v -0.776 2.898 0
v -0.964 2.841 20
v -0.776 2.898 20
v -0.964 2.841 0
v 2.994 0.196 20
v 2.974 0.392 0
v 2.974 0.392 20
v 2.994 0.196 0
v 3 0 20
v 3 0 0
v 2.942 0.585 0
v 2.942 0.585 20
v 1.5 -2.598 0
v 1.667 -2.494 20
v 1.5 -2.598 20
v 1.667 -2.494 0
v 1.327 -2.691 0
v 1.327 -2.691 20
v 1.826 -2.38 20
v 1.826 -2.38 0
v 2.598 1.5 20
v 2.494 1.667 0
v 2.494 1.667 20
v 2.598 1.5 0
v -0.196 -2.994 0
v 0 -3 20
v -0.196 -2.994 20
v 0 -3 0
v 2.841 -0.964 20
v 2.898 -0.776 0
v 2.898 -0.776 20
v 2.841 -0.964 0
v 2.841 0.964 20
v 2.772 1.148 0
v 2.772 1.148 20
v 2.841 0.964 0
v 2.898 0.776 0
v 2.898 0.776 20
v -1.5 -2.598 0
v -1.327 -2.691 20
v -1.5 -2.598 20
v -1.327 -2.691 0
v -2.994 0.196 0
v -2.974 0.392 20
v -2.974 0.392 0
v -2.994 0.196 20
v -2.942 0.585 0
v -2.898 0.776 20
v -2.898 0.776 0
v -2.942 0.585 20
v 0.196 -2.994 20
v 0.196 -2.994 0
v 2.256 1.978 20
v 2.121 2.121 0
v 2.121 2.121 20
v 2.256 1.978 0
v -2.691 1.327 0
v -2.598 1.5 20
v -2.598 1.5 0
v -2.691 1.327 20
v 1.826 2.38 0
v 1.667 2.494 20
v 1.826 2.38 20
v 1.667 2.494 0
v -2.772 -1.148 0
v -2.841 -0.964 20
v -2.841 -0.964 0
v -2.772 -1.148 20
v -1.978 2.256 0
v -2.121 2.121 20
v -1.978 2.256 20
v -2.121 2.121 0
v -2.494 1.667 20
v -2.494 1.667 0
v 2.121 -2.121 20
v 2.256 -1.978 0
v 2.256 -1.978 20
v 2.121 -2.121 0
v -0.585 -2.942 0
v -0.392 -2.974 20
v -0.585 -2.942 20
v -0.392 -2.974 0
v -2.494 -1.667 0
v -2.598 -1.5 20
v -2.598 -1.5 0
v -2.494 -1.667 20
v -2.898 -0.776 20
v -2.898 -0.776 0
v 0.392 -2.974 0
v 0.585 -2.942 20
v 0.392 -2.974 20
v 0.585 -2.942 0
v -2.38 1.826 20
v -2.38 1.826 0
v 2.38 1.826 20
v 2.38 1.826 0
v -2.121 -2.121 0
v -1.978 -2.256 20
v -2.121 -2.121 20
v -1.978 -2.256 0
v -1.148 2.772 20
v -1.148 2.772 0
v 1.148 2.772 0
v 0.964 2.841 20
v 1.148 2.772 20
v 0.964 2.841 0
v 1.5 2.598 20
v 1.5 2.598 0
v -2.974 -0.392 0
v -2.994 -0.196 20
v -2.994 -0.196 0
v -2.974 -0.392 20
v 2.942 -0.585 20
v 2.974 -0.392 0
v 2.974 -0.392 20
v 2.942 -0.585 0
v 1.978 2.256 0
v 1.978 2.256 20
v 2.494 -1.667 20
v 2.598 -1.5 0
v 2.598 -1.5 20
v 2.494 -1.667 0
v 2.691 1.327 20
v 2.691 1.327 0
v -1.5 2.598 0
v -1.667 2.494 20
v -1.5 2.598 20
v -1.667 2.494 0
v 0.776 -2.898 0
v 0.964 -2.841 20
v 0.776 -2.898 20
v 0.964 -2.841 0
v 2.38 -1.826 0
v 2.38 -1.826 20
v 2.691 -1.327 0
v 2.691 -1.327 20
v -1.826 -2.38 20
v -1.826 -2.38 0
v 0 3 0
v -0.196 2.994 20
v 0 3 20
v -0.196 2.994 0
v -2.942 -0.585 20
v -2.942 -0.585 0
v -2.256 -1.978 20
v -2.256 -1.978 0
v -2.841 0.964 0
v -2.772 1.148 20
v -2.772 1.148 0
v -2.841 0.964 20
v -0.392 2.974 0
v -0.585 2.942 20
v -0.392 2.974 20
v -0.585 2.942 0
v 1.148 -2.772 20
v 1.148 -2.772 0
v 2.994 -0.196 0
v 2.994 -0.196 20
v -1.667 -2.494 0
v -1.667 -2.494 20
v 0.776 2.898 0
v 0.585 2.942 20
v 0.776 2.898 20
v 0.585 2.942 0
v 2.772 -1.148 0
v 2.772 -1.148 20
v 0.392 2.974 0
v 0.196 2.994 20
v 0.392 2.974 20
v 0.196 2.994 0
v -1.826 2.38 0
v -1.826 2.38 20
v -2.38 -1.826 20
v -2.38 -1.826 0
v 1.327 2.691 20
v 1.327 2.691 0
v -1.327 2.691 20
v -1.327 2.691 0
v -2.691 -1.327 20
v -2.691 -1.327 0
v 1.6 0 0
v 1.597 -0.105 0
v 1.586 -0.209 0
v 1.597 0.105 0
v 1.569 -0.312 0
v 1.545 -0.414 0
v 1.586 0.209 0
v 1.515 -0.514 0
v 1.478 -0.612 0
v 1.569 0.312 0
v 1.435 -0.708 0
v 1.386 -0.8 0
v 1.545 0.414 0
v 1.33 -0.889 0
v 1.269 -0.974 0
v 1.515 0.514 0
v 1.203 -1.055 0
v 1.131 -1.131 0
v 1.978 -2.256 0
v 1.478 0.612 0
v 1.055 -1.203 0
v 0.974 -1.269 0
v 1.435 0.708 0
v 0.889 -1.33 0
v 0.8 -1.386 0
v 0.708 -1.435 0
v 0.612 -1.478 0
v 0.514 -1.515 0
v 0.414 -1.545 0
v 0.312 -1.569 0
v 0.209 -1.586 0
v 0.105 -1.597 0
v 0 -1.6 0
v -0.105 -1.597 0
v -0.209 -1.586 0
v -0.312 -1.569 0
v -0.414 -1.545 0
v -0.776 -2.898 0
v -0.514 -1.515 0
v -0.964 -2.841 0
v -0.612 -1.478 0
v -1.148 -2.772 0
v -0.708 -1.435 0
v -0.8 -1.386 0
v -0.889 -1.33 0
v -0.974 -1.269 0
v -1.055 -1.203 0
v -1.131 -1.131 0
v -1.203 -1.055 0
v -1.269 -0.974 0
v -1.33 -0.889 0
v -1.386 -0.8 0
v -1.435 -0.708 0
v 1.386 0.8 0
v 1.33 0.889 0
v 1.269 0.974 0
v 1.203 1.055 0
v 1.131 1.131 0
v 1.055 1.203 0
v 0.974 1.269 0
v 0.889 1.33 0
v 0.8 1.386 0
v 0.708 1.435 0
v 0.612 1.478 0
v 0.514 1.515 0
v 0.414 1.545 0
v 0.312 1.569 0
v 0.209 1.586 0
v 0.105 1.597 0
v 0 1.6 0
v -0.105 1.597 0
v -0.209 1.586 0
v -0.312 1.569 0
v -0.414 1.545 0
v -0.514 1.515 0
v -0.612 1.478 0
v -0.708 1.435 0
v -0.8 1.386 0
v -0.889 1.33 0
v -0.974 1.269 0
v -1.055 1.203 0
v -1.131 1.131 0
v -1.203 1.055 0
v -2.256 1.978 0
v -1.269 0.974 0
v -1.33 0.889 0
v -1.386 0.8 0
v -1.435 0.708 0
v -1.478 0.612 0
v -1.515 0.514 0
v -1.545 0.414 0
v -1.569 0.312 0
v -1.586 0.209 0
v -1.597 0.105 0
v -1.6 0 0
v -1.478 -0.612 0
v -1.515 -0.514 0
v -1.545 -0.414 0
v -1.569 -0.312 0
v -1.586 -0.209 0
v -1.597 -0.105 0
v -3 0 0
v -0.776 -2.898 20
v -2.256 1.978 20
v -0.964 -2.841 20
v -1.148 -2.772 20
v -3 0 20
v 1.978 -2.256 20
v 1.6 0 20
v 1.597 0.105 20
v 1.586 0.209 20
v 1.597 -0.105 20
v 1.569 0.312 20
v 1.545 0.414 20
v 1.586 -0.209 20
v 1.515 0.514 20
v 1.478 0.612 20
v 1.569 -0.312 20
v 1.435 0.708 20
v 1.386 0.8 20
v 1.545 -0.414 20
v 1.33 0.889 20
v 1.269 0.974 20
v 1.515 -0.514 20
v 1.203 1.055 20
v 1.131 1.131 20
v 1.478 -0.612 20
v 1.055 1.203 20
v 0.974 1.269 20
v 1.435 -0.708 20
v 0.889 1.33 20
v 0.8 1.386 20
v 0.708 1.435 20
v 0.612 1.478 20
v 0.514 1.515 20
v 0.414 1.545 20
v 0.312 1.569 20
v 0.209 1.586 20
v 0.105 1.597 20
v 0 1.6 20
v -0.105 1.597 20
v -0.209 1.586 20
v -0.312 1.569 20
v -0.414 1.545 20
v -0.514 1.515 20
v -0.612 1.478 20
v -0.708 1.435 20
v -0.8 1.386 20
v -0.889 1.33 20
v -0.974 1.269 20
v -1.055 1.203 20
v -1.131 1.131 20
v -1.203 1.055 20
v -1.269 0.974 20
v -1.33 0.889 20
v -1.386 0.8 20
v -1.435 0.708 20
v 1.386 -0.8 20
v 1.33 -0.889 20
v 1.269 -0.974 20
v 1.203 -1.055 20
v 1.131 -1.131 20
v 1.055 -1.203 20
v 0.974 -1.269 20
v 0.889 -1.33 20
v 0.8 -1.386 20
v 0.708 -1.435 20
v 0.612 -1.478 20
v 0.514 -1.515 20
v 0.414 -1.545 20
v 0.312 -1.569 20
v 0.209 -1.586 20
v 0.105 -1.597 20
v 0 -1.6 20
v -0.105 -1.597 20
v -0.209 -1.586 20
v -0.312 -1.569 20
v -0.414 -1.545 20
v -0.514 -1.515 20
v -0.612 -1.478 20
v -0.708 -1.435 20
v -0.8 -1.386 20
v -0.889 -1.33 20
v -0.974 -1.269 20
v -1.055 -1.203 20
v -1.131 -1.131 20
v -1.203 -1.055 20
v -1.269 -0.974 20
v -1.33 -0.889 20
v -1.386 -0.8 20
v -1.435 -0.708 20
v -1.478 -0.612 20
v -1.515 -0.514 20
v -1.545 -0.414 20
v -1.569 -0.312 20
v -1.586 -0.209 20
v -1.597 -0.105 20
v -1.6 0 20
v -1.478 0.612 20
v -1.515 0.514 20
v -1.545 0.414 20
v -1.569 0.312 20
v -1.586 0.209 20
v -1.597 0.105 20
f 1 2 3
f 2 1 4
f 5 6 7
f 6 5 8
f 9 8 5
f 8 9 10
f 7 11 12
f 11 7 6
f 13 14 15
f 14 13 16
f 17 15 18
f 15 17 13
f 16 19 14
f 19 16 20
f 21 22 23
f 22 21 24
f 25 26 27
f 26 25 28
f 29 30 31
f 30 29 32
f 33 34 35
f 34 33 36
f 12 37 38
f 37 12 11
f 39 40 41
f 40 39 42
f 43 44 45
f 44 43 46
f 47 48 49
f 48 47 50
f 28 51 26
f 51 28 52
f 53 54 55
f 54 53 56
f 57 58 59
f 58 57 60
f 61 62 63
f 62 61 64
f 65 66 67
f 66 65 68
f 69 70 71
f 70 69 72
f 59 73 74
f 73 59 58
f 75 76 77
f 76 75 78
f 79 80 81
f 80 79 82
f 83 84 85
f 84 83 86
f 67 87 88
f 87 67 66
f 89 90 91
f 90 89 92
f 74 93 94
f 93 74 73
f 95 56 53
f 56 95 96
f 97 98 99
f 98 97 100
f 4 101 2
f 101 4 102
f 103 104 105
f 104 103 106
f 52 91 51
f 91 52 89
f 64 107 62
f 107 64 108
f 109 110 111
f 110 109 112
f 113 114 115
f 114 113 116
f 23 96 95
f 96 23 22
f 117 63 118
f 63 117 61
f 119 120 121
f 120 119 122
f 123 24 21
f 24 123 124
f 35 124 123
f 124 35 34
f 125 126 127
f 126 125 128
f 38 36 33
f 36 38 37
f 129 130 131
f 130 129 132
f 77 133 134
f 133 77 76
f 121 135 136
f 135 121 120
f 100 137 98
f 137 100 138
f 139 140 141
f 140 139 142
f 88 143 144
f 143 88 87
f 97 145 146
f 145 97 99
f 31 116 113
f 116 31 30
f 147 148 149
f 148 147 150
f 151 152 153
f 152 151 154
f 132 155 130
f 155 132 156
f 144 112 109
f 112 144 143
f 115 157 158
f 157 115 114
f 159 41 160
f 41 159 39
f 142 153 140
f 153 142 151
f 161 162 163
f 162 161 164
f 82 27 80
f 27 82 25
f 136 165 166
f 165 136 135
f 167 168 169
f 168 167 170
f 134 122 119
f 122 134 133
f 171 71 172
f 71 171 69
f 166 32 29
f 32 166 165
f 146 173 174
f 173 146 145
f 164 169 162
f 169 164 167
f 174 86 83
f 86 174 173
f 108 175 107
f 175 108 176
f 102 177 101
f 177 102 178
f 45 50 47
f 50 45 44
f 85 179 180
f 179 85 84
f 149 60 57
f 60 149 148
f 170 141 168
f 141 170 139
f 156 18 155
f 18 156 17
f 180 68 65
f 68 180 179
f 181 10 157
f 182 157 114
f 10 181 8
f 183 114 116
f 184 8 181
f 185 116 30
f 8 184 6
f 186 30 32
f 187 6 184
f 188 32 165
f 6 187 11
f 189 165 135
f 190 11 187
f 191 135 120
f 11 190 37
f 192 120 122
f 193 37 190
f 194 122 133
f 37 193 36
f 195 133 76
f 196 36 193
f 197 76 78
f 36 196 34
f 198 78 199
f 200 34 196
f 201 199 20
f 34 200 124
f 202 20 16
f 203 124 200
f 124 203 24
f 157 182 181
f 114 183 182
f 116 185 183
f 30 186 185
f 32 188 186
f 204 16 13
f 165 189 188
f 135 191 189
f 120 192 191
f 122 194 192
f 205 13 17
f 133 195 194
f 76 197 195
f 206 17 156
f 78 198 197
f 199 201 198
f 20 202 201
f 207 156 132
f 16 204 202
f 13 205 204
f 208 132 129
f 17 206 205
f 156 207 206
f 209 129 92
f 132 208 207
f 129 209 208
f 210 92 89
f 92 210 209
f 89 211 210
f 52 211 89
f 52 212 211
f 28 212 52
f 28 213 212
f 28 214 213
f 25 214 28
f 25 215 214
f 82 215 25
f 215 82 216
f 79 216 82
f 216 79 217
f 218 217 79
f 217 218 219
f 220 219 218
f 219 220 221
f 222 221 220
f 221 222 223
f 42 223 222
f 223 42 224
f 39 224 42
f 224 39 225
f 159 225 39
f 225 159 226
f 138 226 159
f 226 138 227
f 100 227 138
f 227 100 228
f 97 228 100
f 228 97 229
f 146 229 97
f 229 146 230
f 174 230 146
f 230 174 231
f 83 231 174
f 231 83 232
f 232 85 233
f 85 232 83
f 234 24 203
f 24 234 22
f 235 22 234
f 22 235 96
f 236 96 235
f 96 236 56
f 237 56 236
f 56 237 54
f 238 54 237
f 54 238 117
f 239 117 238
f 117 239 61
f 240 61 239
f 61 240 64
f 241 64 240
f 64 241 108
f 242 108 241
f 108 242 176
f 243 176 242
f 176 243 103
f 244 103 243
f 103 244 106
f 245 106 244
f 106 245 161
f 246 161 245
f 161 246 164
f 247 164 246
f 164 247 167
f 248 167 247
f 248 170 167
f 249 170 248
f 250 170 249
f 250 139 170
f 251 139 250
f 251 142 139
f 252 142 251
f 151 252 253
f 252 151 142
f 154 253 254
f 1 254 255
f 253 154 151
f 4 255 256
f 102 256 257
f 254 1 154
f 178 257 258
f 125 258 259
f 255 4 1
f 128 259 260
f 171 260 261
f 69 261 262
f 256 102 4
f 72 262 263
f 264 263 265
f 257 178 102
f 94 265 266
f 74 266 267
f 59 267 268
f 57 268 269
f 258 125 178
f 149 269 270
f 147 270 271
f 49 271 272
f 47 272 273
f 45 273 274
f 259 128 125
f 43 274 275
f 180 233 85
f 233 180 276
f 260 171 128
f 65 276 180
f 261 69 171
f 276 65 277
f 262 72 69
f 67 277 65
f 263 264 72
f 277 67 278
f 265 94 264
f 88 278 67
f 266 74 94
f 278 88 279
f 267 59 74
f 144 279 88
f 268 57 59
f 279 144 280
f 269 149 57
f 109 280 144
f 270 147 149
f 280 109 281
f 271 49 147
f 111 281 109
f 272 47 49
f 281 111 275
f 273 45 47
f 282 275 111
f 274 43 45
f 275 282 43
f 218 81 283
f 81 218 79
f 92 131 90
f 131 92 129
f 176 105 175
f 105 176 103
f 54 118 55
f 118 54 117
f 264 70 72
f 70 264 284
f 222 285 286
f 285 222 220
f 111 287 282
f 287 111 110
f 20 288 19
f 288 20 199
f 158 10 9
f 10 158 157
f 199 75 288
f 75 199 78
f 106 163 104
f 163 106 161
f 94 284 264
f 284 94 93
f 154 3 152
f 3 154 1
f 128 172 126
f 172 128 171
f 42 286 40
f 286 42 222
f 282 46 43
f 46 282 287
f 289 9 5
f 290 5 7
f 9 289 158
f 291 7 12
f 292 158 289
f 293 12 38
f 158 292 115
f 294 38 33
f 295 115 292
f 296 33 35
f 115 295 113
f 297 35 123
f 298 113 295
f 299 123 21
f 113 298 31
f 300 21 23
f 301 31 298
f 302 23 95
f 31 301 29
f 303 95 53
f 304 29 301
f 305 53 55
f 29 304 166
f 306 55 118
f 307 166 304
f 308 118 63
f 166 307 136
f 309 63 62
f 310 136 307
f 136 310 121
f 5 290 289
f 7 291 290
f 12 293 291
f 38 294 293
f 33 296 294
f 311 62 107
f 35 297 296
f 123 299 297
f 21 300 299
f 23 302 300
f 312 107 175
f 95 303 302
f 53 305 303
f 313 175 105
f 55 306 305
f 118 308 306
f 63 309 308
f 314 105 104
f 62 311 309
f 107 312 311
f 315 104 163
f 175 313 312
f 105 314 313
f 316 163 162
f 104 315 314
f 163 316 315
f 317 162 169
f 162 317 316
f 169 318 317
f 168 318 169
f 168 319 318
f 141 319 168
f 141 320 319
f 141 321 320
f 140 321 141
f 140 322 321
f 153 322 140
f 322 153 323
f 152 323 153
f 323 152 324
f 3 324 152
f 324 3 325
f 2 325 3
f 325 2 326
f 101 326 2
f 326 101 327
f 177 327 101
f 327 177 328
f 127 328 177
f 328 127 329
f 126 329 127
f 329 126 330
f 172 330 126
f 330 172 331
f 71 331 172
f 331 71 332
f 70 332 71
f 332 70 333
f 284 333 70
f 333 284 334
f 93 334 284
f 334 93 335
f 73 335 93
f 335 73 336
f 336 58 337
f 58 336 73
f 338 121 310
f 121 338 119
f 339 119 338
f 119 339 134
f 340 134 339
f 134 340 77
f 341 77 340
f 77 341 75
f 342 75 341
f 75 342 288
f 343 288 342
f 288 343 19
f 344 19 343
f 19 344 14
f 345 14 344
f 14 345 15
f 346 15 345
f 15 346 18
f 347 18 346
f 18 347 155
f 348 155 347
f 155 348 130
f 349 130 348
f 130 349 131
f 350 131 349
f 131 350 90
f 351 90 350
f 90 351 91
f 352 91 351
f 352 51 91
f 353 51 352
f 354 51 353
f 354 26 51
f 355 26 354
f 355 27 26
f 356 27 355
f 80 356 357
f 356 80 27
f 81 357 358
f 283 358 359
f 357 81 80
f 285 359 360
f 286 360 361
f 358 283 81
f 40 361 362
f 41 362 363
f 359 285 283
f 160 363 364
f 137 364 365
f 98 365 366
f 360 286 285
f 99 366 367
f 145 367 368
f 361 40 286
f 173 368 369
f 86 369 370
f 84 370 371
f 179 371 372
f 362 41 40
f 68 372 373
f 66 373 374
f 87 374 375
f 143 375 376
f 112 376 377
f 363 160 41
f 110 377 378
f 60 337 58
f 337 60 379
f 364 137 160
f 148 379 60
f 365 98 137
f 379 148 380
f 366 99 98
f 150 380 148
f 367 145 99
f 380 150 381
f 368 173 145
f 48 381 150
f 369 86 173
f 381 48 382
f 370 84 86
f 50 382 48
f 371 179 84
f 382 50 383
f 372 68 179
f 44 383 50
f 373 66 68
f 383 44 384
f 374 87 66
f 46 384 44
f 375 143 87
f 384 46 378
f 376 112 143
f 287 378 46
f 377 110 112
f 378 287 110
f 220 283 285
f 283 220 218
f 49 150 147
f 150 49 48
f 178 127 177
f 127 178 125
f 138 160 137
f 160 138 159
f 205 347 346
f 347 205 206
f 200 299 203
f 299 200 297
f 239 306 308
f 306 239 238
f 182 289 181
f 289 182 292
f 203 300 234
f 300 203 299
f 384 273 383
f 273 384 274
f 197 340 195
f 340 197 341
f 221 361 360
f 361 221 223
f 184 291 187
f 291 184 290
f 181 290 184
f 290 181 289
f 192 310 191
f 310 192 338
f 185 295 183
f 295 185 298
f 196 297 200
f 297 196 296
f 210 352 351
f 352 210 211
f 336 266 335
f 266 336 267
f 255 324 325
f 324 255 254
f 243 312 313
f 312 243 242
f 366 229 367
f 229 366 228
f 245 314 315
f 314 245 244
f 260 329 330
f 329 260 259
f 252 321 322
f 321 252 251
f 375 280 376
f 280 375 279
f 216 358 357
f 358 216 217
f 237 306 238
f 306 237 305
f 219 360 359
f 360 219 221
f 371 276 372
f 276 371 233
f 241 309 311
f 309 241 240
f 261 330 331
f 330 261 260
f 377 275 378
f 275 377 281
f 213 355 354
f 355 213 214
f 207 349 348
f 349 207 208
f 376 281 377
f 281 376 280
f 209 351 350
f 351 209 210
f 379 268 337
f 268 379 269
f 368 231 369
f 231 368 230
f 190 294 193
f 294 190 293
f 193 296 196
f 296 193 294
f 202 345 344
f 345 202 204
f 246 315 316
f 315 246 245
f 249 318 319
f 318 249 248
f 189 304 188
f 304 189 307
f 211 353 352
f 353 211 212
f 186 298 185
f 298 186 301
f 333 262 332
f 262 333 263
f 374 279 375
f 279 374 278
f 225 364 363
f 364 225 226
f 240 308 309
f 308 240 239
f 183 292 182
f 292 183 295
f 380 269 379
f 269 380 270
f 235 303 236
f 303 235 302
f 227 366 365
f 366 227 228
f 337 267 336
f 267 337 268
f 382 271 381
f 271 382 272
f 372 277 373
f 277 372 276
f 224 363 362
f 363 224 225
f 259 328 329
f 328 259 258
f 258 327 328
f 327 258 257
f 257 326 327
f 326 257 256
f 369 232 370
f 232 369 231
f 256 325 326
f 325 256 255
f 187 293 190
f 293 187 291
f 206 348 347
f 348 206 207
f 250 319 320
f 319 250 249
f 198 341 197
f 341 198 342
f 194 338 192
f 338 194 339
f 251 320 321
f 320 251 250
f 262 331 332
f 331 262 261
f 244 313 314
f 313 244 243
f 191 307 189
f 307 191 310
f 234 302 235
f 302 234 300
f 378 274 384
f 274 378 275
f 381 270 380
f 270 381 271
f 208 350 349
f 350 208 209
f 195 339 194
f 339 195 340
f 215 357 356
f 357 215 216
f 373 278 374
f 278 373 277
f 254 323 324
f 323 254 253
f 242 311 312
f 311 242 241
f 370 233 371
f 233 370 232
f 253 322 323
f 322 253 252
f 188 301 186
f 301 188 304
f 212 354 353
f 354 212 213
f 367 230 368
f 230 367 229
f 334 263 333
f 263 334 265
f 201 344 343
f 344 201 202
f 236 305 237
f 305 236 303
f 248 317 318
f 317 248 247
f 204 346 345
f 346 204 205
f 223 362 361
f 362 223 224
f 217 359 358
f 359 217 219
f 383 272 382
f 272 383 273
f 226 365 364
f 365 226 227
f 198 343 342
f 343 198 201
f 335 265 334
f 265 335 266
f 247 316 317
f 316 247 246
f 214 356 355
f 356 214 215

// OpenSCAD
$fn = 96;

thread_d = 3.0;      // mm (nominal)
length = 20.0;       // mm
outer_d = 6.0;       // mm (assumed since diameter was "None")
hole_clearance = 0.2; // mm added to thread diameter for through-hole

difference() {
    cylinder(h = length, d = outer_d);
    translate([0, 0, -0.1])
        cylinder(h = length + 0.2, d = thread_d + hole_clearance);
}
